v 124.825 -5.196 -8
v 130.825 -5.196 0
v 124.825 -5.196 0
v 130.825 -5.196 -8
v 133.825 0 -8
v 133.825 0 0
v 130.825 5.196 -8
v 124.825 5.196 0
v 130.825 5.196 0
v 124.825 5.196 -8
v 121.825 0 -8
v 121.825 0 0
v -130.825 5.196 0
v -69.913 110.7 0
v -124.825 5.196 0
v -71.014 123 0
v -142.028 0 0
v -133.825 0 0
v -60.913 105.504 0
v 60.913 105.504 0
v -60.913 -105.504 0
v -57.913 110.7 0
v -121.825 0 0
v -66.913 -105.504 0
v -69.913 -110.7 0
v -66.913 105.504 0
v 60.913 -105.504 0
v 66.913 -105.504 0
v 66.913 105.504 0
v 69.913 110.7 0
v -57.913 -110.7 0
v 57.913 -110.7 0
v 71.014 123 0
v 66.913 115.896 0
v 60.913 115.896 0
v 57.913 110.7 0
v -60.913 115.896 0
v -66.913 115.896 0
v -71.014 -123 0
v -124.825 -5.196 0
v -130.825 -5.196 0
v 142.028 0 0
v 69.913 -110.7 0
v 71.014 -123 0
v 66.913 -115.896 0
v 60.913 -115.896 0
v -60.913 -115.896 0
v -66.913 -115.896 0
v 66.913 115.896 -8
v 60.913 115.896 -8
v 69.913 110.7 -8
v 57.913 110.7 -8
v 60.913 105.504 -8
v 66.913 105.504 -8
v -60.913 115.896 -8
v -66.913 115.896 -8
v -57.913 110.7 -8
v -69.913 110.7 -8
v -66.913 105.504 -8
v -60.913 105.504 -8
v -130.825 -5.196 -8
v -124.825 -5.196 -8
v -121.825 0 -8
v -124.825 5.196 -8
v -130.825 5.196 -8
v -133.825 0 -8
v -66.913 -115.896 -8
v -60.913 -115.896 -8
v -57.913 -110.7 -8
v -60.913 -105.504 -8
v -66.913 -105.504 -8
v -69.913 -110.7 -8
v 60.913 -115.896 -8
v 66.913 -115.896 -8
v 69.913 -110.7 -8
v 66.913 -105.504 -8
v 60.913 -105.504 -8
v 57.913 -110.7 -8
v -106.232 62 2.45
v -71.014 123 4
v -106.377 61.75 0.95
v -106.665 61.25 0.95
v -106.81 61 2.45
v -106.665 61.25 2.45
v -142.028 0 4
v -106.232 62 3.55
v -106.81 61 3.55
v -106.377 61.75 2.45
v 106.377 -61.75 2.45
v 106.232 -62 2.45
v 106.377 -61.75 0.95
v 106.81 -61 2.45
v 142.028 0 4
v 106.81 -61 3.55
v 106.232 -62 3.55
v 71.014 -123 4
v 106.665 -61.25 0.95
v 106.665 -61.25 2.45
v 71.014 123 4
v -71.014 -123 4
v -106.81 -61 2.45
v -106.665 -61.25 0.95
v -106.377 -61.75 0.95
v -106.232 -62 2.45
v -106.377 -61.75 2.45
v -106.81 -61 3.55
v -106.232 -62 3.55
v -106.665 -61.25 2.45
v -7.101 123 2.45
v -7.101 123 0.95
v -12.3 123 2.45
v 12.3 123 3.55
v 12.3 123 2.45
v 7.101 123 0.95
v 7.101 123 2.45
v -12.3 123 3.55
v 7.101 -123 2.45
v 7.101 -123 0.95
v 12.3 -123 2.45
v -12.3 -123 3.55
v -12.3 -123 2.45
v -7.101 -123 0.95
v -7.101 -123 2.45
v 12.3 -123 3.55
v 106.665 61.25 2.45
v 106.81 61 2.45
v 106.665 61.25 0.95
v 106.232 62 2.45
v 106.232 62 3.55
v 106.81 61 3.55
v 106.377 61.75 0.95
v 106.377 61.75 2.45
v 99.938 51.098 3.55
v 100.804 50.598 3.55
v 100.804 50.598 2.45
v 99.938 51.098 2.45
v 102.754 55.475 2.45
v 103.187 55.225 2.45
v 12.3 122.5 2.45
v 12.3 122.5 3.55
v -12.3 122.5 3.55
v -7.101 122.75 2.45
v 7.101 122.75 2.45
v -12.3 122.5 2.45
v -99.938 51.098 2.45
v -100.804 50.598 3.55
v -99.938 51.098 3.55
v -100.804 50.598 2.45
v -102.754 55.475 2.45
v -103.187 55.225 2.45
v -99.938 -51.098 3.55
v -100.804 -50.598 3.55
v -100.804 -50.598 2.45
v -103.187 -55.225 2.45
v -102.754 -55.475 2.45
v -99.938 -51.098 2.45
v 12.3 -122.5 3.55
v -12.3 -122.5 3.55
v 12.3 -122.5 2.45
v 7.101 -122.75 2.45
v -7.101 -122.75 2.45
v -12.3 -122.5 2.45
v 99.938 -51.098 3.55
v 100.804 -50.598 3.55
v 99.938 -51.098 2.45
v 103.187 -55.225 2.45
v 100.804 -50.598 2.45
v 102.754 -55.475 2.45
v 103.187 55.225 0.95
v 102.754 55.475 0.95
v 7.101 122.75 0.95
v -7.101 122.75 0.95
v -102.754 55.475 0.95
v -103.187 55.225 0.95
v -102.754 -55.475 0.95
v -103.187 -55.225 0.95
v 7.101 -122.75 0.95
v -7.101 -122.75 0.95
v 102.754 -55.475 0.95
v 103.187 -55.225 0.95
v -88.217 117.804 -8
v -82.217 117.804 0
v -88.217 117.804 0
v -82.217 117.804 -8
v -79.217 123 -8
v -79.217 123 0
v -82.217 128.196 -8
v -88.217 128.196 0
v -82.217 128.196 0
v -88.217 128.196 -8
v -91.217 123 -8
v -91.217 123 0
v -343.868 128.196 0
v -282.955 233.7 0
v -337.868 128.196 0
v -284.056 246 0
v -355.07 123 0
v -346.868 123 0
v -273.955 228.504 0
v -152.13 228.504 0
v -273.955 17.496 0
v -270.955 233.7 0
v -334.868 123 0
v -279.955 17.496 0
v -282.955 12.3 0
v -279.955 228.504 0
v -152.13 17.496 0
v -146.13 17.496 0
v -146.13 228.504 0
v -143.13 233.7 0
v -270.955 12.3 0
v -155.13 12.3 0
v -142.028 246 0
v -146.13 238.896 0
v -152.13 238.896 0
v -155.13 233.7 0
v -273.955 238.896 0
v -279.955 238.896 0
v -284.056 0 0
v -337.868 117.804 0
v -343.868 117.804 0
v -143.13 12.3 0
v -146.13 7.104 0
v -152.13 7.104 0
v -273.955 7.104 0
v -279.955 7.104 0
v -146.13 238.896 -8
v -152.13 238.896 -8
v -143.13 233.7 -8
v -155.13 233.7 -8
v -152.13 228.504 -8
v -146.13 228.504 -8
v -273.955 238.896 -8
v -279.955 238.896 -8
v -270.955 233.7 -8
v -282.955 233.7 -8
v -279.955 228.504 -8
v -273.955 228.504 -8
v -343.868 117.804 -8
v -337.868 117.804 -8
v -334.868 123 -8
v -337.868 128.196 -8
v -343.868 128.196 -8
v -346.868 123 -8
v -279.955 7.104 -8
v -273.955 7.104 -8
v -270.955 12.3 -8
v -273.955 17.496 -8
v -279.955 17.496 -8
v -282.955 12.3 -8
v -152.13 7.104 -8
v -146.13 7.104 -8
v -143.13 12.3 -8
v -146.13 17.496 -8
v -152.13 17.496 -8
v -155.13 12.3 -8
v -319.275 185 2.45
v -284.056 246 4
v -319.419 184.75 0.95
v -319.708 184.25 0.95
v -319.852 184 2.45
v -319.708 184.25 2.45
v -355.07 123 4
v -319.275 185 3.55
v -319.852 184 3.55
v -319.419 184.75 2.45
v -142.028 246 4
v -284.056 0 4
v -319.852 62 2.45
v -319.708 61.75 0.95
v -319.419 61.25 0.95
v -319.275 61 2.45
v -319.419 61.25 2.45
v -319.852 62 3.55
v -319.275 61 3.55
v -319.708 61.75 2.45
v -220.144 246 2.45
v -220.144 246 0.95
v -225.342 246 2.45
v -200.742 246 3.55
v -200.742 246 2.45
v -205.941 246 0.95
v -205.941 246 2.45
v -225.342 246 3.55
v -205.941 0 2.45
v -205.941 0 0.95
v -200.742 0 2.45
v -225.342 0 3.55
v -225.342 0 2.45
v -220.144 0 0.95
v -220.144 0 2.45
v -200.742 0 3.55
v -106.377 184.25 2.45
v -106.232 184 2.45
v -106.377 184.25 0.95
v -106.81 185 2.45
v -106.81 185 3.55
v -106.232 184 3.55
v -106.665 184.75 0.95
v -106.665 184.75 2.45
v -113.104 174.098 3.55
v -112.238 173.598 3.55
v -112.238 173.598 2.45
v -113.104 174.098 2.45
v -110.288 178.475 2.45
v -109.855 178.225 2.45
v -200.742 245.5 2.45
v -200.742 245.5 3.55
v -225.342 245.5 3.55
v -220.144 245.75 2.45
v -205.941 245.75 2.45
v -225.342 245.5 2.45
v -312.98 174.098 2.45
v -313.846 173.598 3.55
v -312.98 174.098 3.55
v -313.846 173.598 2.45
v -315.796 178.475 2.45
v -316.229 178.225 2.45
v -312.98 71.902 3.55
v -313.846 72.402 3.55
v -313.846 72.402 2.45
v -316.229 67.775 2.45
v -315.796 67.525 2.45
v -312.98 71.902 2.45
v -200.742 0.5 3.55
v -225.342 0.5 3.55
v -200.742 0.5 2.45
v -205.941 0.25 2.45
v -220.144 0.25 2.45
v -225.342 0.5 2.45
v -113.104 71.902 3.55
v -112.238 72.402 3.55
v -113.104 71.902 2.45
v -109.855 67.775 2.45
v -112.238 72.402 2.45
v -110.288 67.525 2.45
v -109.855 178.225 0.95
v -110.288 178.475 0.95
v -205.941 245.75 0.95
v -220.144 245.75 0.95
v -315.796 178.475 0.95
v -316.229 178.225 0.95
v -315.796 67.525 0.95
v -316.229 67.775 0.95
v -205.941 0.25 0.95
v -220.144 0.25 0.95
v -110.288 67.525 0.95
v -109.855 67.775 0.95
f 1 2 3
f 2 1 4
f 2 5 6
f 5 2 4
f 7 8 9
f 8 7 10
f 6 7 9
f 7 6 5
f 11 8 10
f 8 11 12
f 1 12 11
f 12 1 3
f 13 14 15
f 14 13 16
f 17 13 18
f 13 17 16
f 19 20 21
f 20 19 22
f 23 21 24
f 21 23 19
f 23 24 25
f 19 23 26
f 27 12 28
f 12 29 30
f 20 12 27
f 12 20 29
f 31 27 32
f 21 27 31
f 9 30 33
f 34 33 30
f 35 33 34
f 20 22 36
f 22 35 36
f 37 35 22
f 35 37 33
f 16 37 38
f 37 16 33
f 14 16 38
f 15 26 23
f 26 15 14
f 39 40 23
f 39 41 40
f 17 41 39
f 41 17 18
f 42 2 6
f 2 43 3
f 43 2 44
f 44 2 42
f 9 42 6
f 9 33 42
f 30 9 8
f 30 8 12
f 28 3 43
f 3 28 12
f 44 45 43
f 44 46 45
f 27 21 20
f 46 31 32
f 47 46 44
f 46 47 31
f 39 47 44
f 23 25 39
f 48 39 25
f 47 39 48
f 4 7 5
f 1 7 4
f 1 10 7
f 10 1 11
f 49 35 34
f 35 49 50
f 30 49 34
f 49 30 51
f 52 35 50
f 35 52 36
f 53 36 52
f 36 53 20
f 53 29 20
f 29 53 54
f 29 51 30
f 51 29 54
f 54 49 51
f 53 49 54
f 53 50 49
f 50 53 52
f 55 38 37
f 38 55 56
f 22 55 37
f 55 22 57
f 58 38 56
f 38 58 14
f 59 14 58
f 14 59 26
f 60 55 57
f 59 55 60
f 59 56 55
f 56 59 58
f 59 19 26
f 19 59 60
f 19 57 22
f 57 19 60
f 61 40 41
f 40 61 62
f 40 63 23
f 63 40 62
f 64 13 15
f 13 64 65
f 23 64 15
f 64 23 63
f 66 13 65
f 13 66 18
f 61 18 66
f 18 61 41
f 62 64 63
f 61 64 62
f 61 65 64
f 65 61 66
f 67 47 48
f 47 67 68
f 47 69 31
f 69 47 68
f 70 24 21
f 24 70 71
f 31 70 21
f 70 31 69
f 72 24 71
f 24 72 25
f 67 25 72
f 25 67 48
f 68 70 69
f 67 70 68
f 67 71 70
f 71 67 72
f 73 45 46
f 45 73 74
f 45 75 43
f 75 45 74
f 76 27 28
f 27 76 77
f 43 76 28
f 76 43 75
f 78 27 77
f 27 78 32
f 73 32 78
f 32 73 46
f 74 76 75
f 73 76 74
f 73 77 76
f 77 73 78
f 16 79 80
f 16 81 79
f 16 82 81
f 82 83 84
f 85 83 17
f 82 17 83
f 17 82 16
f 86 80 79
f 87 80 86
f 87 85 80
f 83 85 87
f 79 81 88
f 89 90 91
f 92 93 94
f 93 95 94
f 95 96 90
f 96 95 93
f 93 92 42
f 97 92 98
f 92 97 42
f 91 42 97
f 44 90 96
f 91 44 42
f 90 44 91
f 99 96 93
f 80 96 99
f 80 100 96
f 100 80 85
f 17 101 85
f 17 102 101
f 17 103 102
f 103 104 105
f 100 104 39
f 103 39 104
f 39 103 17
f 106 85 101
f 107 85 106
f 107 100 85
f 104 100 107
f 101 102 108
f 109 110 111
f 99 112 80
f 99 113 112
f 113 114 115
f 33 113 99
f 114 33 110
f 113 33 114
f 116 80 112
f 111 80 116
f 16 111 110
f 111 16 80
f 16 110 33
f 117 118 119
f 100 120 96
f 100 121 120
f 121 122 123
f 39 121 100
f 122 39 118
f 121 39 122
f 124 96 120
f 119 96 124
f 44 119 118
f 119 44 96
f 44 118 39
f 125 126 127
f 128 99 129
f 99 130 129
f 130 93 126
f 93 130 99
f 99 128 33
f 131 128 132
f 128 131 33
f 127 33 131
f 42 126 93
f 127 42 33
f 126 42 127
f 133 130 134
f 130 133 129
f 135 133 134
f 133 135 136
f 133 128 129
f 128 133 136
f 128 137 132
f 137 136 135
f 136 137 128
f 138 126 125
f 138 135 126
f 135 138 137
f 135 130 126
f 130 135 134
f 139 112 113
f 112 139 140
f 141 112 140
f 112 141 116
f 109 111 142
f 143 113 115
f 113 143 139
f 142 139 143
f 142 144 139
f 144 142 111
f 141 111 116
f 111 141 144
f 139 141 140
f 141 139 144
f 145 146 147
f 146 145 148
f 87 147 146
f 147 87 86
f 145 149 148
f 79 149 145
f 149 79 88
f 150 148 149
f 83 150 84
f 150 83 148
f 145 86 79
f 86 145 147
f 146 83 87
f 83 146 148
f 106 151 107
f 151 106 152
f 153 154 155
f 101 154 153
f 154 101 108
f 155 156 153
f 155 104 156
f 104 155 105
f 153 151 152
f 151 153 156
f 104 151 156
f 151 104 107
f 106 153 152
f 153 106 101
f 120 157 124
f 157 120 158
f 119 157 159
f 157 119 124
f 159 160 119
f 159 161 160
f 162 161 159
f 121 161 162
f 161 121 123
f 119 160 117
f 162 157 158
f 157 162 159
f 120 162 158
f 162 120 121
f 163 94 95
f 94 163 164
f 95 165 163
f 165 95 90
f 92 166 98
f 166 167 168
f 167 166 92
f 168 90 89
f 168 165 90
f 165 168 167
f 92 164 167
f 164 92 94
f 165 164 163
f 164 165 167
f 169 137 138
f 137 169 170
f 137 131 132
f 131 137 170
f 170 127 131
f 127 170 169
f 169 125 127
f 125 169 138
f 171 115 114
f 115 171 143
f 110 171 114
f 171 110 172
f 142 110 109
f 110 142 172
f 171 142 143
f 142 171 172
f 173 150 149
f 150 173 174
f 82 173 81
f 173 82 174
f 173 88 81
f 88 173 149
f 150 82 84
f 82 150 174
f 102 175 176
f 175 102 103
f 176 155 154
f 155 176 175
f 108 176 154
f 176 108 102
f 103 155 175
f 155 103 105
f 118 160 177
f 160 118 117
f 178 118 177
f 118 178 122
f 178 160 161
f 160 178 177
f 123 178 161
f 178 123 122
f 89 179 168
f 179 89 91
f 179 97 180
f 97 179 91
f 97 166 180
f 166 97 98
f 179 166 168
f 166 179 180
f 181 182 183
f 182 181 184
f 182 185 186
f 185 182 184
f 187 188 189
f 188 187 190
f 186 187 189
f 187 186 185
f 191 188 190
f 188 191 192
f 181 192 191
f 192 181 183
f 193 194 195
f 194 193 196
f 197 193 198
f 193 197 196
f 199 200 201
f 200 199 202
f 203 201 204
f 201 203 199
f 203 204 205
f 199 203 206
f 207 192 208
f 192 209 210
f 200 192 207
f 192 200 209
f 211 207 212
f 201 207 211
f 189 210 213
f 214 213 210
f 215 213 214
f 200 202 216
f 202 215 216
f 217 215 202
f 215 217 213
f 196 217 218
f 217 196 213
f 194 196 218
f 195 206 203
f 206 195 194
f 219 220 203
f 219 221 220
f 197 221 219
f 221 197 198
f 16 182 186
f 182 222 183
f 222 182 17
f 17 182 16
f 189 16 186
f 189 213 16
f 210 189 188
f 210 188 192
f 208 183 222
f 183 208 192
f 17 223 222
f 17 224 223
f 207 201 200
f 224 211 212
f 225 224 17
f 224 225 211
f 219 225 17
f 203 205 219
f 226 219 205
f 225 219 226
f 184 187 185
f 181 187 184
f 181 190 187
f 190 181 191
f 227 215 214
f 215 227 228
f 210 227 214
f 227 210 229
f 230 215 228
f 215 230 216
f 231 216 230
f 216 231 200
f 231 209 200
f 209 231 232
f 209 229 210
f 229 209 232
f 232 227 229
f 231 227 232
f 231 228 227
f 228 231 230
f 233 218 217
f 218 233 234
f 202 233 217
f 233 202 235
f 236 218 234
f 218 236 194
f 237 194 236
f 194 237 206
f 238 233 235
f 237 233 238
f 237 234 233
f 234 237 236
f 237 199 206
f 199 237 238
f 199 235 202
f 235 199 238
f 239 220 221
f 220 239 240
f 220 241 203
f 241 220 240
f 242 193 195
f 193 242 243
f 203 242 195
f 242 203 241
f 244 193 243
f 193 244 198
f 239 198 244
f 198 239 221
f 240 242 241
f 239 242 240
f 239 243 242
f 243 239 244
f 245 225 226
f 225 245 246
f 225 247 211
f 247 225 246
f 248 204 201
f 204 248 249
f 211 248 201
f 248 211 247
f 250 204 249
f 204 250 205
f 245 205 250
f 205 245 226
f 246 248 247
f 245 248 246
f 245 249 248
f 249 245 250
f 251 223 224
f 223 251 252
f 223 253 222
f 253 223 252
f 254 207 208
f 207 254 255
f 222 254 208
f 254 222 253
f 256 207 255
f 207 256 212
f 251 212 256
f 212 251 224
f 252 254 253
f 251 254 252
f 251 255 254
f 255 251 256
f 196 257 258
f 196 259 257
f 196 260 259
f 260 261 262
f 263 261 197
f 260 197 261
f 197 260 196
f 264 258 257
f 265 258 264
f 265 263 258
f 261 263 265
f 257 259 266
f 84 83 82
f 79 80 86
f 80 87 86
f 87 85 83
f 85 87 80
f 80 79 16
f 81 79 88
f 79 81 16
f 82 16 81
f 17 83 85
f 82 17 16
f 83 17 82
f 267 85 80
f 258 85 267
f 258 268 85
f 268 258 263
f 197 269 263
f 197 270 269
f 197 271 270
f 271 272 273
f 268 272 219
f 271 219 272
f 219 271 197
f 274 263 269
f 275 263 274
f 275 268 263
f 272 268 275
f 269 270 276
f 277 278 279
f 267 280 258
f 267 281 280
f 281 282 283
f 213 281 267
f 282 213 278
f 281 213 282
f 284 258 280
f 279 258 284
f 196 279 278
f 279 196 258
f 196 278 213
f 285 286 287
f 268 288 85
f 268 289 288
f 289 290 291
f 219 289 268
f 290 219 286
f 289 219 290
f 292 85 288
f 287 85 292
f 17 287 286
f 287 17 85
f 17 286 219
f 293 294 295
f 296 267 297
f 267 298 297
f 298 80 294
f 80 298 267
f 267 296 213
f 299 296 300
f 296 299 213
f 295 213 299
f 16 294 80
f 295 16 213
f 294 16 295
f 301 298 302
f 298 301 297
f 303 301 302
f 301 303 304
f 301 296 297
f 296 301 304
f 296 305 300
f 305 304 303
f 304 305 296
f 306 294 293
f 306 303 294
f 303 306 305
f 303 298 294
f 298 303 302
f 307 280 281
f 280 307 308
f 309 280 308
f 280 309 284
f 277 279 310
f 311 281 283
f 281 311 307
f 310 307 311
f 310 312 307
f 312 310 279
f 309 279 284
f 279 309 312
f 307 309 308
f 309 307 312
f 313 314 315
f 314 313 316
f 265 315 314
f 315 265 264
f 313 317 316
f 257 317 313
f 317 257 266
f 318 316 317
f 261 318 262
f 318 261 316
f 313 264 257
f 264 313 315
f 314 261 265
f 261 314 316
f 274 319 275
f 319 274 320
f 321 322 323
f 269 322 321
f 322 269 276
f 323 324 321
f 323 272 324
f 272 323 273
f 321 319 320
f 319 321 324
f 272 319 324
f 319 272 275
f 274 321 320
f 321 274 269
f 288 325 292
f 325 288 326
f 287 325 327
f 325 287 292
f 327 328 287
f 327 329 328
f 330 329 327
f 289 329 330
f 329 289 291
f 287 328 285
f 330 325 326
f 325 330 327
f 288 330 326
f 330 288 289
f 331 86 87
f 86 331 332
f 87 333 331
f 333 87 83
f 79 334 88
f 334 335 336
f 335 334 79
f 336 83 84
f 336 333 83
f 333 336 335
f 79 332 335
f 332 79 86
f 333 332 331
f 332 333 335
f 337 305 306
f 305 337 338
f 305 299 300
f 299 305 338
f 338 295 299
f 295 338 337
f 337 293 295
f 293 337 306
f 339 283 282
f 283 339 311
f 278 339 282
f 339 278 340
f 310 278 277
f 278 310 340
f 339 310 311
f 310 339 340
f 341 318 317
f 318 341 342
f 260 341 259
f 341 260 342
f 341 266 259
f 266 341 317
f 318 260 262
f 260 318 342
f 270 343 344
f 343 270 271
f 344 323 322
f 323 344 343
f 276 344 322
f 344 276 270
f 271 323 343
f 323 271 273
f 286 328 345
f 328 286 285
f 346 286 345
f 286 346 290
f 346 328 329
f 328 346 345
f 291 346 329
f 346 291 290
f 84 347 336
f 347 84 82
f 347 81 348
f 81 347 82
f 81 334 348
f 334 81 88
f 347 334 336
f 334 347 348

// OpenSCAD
// HexTrack Double Tile Module for N-Scale
// Two single hex tiles joined side-to-side with selectable mating sides.

/* [Dimensions] */
hex_flat_to_flat = 246; // [200:260]
plate_thickness = 4; // [2:10]
feet_height = 8; // [5:15]
feet_diameter = 12; // [8:20]
feet_at_vertices = true;
feet_inset = 0.1; // [0:0.5]
center_foot_diameter = 12; // [8:20]

/* [Tracks] */
track_variant = 1; // [1:Single,2:Double,3:Triple]
track_spacing = 33; // [20:40]
cutout_depth = 1; // [0.5:2]
alignment_slit_width = 0.5; // [0.2:1]
alignment_slit_depth = 2; // [1:5]

/* [Features] */
include_feet = true;
include_center_foot = false; // [false, true]
include_cutouts = true;
include_alignment = true;

/* [Double Hex Layout] */
mate_side_hex1 = 2; // [0:5] Side on hex #1 that mates to hex #2
mate_side_hex2 = 5; // [0:5] Side on hex #2 that mates to hex #1
mate_gap = 0; // [0:0.1:5] Extra gap between mated side faces (mm)

/* [Splitting / Printing] */
split_mode = 0; // [0:Full, 1:RightSide, 2:LeftSide]
split_line_angle = 30; // [0:1:359] Direction of split line through model space (degrees)
split_line_offset = 0; // [-200:1:200] Offset perpendicular to split line (mm)
// mode 1 keeps one side of the line, mode 2 keeps the opposite side

// Calculated values
hex_radius = hex_flat_to_flat / sqrt(3);
hex_points = [for (i = [0:5]) [hex_radius * cos(60 * i), hex_radius * sin(60 * i)]];

function side_midpoint(i) = (hex_points[i] + hex_points[(i + 1) % 6]) / 2;
function side_normal_angle(i) = 30 + 60 * i;
function track_positions(variant, spacing) =
    variant == 1 ? [0] :
    variant == 2 ? [-spacing/2, spacing/2] :
    [-spacing, 0, spacing];

module hexagon_plate() {
    linear_extrude(height = plate_thickness)
        polygon(hex_points);
}

module feet() {
    if (include_feet) {
        if (feet_at_vertices) {
            for (p = hex_points) {
                inset_p = p * (1 - feet_inset);
                translate([inset_p[0], inset_p[1], -feet_height])
                    cylinder(d = feet_diameter, h = feet_height, $fn = 6);
            }
        }
        if (include_center_foot) {
            translate([0, 0, -feet_height])
                cylinder(d = center_foot_diameter, h = feet_height, $fn = 6);
        }
    }
}

module track_cutouts() {
    if (include_cutouts) {
        for (i = [0:5]) {
            p1 = hex_points[i];
            p2 = hex_points[(i + 1) % 6];
            mid = (p1 + p2) / 2;
            dir = [p2[1] - p1[1], p1[0] - p2[0]];
            translate([mid[0], mid[1], plate_thickness - cutout_depth])
                rotate([0, 0, atan2(dir[0], dir[1])])
                cube([hex_flat_to_flat / 10, alignment_slit_width * 2, cutout_depth + 0.1], center = true);
        }
    }
}

module alignment_slits() {
    if (include_alignment) {
        positions = track_positions(track_variant, track_spacing);
        for (i = [0:5]) {
            p1 = hex_points[i];
            p2 = hex_points[(i + 1) % 6];
            mid = (p1 + p2) / 2;
            dir = [p2[1] - p1[1], p1[0] - p2[0]];
            dir_norm = dir / norm(dir);
            len = norm(p2 - p1);
            for (pos = positions) {
                offset = pos * dir_norm;
                slit_pos = mid + offset * (len / 2 / max(abs(pos), 1));
                translate([slit_pos[0], slit_pos[1], plate_thickness - alignment_slit_depth])
                    rotate([0, 0, atan2(dir[0], dir[1])])
                    cube([len / 10, alignment_slit_width, alignment_slit_depth + 0.1], center = true);
            }
        }
    }
}

module single_hex_tile() {
    difference() {
        union() {
            hexagon_plate();
            feet();
        }
        track_cutouts();
        alignment_slits();
    }
}

module double_hex_tile() {
    side1 = mate_side_hex1 % 6;
    side2 = mate_side_hex2 % 6;

    angle1 = side_normal_angle(side1);
    // Rotate hex #2 so side2 faces back toward side1.
    rot2 = 180 + 60 * (side1 - side2);
    center_dist = hex_flat_to_flat + mate_gap;
    offset = [center_dist * cos(angle1), center_dist * sin(angle1), 0];

    union() {
        single_hex_tile();
        translate(offset)
            rotate([0, 0, rot2])
            single_hex_tile();
    }
}

module split_cut() {
    if (split_mode != 0) {
        span = hex_flat_to_flat * 12;
        zspan = plate_thickness + feet_height + 200;
        // Convert to a local frame where the split line becomes local Y=0.
        // Then remove one half-space with a large cube.
        translate([-split_line_offset * sin(split_line_angle), split_line_offset * cos(split_line_angle), 0])
            rotate([0, 0, split_line_angle]) {
                if (split_mode == 1) {
                    // Keep local y >= 0: remove local y < 0.
                    translate([-span, -span, -100])
                        cube([2 * span, span, zspan]);
                } else if (split_mode == 2) {
                    // Keep local y <= 0: remove local y > 0.
                    translate([-span, 0, -100])
                        cube([2 * span, span, zspan]);
                }
            }
    }
}

difference() {
    double_hex_tile();
    split_cut();
}
